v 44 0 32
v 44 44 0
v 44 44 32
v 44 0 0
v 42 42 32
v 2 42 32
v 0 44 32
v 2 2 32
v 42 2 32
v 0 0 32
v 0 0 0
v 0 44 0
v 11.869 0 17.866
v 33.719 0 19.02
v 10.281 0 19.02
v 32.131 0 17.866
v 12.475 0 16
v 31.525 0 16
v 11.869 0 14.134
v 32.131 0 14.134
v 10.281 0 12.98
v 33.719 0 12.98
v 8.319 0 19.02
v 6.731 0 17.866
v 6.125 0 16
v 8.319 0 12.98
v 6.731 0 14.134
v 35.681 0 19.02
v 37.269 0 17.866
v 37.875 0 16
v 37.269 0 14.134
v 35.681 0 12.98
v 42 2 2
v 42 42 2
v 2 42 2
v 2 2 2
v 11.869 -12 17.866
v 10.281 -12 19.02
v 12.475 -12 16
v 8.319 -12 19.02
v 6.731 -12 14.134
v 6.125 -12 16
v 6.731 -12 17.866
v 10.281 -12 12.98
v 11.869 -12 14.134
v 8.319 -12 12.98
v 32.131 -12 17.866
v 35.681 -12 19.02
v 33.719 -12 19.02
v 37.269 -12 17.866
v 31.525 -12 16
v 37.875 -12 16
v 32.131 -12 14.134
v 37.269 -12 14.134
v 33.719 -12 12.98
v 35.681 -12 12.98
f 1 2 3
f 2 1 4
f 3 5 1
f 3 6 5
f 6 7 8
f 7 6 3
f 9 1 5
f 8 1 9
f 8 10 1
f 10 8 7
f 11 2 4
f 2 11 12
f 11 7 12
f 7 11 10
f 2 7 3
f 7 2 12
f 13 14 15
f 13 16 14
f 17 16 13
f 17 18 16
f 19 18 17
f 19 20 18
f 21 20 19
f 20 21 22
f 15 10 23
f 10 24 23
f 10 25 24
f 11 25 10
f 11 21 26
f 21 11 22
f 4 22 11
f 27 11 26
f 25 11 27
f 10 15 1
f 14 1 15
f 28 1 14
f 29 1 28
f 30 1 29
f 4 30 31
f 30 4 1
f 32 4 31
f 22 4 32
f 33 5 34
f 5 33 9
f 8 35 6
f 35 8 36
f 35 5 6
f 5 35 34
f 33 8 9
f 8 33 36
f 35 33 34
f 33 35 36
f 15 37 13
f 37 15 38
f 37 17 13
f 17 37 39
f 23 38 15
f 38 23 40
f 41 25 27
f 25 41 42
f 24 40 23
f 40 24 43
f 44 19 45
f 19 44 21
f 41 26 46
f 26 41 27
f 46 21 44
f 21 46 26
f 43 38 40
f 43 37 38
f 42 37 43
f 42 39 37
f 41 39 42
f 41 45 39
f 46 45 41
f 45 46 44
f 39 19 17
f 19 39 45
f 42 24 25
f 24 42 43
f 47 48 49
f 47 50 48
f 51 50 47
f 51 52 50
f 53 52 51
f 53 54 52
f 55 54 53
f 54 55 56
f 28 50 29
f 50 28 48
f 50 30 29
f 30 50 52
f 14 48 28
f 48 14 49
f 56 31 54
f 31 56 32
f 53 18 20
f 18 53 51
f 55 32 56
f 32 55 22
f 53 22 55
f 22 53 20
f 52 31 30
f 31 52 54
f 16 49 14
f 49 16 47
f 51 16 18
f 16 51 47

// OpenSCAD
////////////////////////////////////////////////////////////////////////////
// Manhattan Pegboard Collection v1 : 2 Peg Bin
// designed in NYC by Matt Manhattan (mattmanhattan.com)
////////////////////////////////////////////////////////////////////////////

// These parameters create the INTERIOR size of your bin (in mm)

width = 40;
depth = 40;
height = 32;
thickness = 2; // this is the thickness of the walls (in mm)
pegs = 1; // span between pegs [0 = centered (one peg // 1 = 2 pegs // 2 = 3 pegs // 3 = 4 pegs]

//////////////////////////////////////////////////////////////////
// Pegboard Bin
//////////////////////////////////////////////////////////////////

// This code generates the rectangular shape of your bin

    difference()
    {
        
        // this is the exterior shape
        cube([width+(thickness*2),depth+(thickness*2),height], centerequals);
        
        // this is the interior shape which we are removing
        translate([thickness,thickness,0])
        {
            cube([width,depth,height], centerequals);
        }
    }

// This code generates the base of the bin
// if you comment it out you will remove the base of your bin which can be useful for tools
    
   cube([width+(thickness*2),depth+(thickness*2),thickness], centerequals);
    
//////////////////////////////////////////////////////////////////
// Pegboard Pegs
//////////////////////////////////////////////////////////////////
    
pegCenterToCenterDistance = 25.4; 	    // 1 inch spacing
pegDiameter = 6.35; 					// 1/4 inch peg holes
pegLength = 12;
midpoint = ((2*thickness) + width)/2;
    
// leave this alone - it alters the center point of the model
centerequals = false; 
///////////////////

difference(){
    
// PEG 1
// this rotates the peg 90 degrees
rotate([90,0,0])
    { 
    // this moves the peg    
    translate([(midpoint - ((pegCenterToCenterDistance/2)*pegs)),(height/2),0])
        {    
        cylinder(h=pegLength, r=(pegDiameter/2), center=centerequals);
        }
    }

}

difference(){
    
// PEG 2
// this rotates the peg 90 degrees
rotate([90,0,0])
    { 
    // this moves the peg    
    translate([(midpoint + ((pegCenterToCenterDistance/2)*pegs)),(height/2),0])
        {    
        cylinder(h=pegLength, r=(pegDiameter/2), center=centerequals);
        }
    }
//
}
